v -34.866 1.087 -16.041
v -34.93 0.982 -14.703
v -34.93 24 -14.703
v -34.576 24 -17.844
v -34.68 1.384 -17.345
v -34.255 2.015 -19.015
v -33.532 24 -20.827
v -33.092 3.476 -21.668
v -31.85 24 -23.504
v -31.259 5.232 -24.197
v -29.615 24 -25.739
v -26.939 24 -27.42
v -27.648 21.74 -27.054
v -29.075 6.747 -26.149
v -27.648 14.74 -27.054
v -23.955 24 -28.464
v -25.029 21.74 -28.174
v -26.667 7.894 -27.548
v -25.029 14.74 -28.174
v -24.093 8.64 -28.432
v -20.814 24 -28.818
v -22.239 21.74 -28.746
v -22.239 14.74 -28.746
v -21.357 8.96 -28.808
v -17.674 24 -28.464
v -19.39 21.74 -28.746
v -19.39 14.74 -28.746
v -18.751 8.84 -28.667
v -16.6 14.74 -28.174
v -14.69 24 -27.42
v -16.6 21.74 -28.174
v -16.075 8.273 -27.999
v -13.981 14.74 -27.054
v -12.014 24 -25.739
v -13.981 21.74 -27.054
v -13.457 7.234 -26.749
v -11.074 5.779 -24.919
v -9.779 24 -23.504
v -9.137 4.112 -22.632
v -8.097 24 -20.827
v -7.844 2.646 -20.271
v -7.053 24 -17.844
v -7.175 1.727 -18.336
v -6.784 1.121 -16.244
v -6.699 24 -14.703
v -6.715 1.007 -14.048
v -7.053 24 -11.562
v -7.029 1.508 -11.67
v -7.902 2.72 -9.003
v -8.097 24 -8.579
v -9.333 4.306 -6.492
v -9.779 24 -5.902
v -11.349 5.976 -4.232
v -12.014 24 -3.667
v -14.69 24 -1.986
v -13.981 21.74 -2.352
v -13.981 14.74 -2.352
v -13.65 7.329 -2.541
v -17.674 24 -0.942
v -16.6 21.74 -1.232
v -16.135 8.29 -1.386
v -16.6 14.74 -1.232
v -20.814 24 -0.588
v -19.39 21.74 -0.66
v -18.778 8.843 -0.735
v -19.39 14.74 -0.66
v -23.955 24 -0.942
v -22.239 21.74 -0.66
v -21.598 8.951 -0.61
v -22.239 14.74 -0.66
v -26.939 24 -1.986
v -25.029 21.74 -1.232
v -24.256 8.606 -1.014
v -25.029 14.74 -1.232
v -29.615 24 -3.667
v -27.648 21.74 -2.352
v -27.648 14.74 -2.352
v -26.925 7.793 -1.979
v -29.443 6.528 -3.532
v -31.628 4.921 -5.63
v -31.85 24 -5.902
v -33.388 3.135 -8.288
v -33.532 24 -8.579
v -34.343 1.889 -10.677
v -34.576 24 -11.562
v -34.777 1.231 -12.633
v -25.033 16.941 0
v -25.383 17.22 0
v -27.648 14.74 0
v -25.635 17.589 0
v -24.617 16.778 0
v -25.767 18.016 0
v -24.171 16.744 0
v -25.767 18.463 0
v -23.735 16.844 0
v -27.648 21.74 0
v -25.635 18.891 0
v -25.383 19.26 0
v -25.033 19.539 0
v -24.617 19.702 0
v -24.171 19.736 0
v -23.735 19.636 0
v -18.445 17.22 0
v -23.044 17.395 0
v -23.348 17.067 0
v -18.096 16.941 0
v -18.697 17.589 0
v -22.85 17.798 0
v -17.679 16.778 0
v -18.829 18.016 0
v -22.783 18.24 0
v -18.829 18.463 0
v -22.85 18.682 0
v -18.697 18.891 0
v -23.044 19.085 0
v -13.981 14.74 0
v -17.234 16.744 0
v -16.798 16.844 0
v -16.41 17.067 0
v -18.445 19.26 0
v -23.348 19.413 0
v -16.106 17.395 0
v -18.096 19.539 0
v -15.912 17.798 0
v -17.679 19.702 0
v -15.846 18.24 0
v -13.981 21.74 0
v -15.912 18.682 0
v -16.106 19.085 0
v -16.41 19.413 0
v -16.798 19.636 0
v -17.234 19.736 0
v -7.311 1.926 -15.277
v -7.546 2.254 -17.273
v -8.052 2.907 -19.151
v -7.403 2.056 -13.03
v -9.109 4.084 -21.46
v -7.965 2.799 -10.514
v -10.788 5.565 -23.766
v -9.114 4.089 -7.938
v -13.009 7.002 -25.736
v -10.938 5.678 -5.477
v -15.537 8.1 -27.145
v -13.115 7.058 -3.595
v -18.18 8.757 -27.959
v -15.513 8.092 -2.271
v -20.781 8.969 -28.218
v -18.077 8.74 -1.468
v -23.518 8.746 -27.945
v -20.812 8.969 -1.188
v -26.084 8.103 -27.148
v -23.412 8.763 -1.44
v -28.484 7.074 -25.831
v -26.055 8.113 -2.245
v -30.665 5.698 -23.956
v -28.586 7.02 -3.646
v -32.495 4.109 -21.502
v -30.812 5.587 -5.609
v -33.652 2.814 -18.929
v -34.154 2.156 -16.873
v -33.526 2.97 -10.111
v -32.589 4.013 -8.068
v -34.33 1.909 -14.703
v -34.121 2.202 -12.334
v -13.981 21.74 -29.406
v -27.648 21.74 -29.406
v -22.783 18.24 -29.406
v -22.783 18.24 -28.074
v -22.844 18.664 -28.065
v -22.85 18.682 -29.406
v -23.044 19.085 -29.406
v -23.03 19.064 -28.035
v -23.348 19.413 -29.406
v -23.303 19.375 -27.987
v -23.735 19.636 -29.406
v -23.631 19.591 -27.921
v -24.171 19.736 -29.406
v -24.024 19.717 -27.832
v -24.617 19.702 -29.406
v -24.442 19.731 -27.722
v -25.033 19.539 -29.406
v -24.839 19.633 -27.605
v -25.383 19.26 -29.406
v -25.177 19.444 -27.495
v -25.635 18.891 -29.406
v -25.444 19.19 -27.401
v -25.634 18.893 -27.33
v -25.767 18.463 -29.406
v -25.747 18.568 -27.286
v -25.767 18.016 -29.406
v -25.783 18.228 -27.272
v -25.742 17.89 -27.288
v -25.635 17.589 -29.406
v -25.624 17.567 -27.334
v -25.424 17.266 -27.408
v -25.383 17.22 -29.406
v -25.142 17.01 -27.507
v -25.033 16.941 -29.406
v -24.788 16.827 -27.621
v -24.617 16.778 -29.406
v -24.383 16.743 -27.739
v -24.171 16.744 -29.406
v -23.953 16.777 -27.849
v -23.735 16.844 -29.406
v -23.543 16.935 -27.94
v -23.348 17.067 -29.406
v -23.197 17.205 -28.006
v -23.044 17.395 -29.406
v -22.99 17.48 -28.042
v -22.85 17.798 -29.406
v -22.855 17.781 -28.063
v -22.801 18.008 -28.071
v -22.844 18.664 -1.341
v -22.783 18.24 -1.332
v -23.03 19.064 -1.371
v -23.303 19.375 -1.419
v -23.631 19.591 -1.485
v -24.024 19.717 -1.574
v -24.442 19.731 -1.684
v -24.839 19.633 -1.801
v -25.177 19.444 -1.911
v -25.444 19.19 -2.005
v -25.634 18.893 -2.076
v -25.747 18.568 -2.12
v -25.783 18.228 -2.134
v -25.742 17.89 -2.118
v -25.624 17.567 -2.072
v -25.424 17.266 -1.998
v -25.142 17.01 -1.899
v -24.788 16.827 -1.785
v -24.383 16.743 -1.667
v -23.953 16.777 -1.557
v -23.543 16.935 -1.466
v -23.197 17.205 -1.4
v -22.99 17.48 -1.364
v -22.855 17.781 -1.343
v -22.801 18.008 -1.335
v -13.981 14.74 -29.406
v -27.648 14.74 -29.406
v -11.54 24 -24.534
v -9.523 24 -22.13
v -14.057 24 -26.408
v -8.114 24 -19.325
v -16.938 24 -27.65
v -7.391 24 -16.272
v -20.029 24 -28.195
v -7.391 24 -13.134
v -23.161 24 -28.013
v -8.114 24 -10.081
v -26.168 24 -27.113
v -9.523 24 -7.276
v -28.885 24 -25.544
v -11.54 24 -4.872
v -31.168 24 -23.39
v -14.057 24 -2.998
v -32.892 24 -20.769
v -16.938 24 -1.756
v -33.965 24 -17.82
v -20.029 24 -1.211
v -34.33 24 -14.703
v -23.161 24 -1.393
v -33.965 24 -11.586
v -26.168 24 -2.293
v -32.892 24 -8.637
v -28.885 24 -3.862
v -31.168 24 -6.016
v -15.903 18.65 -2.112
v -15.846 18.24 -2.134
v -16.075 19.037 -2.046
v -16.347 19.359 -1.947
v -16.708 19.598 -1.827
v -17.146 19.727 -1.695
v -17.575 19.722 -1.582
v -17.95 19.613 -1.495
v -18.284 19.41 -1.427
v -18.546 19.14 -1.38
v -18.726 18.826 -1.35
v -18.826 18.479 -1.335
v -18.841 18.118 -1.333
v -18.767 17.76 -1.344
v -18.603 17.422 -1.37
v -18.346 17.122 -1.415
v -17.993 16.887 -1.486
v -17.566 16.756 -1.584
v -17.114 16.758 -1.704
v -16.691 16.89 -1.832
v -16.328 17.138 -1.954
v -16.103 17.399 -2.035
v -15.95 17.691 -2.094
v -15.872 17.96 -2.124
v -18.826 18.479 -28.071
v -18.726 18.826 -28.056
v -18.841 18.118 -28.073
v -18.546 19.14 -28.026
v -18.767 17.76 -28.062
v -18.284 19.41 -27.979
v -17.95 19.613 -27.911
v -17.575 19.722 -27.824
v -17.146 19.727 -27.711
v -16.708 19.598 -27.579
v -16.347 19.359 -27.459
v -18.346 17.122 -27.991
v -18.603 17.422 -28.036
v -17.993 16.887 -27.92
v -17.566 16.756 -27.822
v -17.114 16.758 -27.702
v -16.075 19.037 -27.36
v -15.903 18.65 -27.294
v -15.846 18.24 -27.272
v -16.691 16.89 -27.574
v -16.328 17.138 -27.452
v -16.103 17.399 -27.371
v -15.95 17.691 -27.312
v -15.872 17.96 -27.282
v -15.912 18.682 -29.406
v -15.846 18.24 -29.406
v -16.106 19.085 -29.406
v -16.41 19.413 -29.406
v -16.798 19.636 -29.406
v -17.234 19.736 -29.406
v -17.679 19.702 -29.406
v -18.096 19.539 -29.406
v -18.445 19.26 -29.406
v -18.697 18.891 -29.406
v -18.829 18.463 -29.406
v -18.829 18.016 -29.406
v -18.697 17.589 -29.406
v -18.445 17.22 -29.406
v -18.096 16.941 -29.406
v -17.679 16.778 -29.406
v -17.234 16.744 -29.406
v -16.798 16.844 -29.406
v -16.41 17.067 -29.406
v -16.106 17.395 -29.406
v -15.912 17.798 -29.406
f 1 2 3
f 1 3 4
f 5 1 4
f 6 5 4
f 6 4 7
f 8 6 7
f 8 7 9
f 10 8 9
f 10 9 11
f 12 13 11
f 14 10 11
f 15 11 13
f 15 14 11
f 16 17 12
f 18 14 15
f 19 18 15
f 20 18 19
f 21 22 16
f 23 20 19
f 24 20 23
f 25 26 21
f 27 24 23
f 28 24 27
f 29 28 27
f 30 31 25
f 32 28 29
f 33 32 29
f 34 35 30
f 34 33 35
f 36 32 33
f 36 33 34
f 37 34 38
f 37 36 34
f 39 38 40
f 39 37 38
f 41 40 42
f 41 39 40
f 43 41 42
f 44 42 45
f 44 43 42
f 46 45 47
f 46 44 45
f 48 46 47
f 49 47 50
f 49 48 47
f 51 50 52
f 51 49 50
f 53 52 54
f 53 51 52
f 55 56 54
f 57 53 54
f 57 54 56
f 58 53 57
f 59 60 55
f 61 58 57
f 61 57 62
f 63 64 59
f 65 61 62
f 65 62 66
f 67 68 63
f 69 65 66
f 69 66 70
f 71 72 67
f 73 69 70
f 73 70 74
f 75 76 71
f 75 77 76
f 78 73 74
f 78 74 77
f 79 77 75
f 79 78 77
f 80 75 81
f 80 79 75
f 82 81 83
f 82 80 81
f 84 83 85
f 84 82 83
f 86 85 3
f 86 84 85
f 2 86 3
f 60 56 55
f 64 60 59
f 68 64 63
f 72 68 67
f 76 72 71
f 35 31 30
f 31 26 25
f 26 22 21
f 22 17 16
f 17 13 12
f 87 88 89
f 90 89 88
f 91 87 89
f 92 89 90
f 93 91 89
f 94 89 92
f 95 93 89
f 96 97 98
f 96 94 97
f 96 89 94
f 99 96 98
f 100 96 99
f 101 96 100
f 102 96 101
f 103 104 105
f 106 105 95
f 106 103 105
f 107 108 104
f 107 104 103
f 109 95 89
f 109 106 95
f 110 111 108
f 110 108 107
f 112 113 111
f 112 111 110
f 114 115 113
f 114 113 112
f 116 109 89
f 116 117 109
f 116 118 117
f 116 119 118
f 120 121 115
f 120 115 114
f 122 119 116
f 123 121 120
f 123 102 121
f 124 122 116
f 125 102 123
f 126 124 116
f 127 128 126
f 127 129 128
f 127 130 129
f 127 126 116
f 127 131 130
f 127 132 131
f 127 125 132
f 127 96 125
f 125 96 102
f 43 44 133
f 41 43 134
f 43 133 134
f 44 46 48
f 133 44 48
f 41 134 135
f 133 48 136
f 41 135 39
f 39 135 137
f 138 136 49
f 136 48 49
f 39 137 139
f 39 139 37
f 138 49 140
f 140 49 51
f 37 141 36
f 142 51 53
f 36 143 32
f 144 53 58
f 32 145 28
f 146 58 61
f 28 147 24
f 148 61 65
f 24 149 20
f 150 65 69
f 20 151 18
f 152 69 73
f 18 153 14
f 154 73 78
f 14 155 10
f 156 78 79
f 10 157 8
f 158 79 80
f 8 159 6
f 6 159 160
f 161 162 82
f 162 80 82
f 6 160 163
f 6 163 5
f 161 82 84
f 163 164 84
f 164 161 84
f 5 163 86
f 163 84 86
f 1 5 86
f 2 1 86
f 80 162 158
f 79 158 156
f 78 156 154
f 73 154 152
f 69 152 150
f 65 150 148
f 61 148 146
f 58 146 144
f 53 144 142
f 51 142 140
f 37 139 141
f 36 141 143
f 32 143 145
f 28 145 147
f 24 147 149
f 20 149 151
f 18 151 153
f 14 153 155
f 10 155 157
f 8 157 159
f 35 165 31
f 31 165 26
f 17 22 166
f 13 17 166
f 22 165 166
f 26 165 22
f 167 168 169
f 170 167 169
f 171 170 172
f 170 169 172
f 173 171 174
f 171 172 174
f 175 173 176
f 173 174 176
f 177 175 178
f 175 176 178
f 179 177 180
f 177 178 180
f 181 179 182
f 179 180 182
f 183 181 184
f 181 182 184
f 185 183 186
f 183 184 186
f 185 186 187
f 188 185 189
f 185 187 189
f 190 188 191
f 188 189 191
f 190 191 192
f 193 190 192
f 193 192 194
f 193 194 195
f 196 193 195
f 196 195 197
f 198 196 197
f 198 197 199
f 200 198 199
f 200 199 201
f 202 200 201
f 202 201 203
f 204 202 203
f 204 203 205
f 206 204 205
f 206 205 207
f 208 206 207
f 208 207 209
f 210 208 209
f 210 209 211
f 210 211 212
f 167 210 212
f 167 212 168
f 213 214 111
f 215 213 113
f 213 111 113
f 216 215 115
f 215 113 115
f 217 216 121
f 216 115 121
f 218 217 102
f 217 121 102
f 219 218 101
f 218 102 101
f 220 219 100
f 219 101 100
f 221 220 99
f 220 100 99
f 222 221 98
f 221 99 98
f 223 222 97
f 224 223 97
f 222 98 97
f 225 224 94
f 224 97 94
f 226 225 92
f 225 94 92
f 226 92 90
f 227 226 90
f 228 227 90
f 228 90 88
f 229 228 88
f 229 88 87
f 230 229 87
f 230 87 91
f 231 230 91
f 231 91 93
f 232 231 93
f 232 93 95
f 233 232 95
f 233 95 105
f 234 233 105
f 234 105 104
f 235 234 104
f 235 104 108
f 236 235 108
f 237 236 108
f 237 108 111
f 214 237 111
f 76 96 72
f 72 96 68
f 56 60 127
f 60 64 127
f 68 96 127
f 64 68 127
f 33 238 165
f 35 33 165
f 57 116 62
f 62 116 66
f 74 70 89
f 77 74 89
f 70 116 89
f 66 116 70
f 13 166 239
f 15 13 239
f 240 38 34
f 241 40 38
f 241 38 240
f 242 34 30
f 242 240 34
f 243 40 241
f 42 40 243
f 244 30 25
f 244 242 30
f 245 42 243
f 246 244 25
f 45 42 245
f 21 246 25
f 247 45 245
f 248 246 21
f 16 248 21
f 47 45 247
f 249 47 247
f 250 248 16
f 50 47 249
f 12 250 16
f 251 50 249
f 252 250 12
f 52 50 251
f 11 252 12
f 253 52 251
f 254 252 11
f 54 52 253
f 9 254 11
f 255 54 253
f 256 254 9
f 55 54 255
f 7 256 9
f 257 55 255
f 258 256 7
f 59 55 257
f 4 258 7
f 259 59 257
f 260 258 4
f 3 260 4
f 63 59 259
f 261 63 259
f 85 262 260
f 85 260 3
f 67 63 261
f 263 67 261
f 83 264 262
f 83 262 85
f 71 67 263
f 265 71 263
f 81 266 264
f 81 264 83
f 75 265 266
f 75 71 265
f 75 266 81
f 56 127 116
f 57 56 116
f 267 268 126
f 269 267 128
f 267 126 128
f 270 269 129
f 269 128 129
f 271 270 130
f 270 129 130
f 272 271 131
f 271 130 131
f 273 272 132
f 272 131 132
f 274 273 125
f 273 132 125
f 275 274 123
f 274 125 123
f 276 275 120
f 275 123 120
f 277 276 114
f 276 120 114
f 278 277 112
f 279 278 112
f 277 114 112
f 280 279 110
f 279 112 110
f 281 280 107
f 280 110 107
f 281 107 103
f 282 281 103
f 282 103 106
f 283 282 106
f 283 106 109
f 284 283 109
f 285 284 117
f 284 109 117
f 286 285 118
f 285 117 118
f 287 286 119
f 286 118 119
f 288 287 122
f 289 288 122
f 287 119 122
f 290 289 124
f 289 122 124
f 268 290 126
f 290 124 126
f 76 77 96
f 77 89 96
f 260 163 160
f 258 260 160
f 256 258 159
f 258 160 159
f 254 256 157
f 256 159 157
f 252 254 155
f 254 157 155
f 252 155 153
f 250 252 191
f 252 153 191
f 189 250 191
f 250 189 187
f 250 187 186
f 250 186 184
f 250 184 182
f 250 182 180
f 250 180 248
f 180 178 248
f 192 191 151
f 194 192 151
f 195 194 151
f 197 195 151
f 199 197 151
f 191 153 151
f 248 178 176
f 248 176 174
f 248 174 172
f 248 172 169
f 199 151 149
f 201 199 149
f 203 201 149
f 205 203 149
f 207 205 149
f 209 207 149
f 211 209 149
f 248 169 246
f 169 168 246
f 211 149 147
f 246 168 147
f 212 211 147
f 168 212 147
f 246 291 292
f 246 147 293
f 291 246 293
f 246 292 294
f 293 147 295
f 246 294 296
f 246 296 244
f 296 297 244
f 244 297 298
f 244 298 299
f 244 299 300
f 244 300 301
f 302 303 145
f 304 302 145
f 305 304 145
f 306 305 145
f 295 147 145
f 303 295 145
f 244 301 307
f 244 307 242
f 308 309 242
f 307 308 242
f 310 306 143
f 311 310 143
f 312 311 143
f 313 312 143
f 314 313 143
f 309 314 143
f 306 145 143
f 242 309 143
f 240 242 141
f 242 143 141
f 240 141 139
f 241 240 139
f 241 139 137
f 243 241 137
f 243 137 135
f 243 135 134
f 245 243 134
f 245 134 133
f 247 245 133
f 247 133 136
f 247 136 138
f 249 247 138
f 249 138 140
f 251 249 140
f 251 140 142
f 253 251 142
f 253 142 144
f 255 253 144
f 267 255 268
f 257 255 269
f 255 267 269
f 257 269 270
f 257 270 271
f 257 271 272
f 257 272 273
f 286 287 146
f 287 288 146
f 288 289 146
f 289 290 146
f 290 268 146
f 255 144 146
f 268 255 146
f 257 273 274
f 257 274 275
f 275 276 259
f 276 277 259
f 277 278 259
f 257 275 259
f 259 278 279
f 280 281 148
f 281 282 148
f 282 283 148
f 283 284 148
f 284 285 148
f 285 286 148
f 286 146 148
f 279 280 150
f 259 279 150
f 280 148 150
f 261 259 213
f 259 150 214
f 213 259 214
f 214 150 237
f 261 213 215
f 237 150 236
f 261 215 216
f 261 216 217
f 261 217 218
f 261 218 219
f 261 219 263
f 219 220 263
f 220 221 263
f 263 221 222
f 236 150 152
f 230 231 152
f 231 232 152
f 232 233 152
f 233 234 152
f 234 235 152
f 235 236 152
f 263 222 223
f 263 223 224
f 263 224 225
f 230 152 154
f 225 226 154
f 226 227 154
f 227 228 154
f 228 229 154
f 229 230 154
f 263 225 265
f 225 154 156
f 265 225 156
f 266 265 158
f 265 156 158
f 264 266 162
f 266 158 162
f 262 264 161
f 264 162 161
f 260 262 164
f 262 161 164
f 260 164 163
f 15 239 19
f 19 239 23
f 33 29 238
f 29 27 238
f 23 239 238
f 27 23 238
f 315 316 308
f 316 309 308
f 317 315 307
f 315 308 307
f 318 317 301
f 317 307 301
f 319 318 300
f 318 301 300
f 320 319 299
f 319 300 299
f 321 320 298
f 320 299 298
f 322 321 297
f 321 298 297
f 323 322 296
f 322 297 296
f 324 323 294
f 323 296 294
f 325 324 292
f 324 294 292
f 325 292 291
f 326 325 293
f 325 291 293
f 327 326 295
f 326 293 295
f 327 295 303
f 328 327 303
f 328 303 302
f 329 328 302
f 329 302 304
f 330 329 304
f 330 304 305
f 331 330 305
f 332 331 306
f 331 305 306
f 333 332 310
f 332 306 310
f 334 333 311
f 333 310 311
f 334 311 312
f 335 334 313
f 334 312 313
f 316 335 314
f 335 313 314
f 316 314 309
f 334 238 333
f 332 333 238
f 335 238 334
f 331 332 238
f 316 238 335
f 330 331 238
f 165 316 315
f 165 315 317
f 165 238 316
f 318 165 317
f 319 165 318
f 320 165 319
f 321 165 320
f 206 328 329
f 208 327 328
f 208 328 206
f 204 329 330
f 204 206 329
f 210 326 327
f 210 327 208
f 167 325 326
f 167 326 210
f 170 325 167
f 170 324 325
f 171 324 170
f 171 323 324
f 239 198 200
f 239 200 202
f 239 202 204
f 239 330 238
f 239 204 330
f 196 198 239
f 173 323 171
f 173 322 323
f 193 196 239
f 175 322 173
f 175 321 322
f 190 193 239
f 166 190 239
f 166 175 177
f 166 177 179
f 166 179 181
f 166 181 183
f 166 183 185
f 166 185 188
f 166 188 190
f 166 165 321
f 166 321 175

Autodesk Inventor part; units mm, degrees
ref_plane "YZ Plane" through (0, 0, 0) normal (1, 0, 0) x (0, 1, 0)
ref_plane "XZ Plane" through (0, 0, 0) normal (0, 1, 0) x (-1, 0, 0)
sketch "Sketch1" plane through (0, 0, 0) normal (0, 1, 0) x (-1, 0, 0)
  circle A0 centre (20.8145, -14.703) radius 14.1152
  circle A1 centre (20.8145, -14.703) radius 13.5152
  point P0 (0, 0)
  dimension "d0" = 0.6
extrude "Extrusion1" add sketch "Sketch1" along normal blind 24
ref_plane "Work Plane1" through (0, 0, -29) normal (0, 0, 1) x (1, 0, 0)
sketch "Sketch3" plane through (0, 0, 0) normal (1, 0, 0) x (0, 1, 0)
  point P0 (0, 0)
sketch "Sketch4" plane through (0, 0, 0) normal (0, 0, 1) x (1, 0, 0)
  line L0 (-34.9297, 0) -> (-34.9297, 24) projected
  line L1 (-6.6992, 0) -> (-6.6992, 24) projected
  line L2 (-34.9297, 18.2399) -> (-20.8145, 18.2399) construction
  line L3 (-20.8145, 18.2399) -> (-6.6992, 18.2399) construction
  line L4 (-13.9813, 14.7399) -> (-27.6476, 14.7399)
  line L5 (-27.6476, 14.7399) -> (-27.6476, 21.7399)
  line L6 (-27.6476, 21.7399) -> (-13.9813, 21.7399)
  line L7 (-13.9813, 21.7399) -> (-13.9813, 14.7399)
  line L8 (-13.9813, 14.7399) -> (-27.6476, 21.7399) construction
  line L9 (-27.6476, 14.7399) -> (-13.9813, 21.7399) construction
  point P0 (0, 0)
  dimension "d14" = 7
extrude "Extrusion3" add sketch "Sketch4" against normal up to surface
sketch "Sketch5" plane through (-20.8145, 24, -14.703) normal (0, 1, 0) x (1, 0, 0)
  point P0 (20.8145, -14.703)
  point P1 (0, 0)
ref_plane "Work Plane2" through (-20.8145, 24, -14.703) normal (0, 0, 1) x (1, 0, 0)
mirror "Mirror1" about plane through (-20.8145, 24, -14.703) normal (0, 0, 1) of "Extrusion3"
sketch "Sketch6" plane through (0, 0, 0) normal (0, 0, 1) x (1, 0, 0)
  line L0 (-13.9813, 14.7399) -> (-13.9813, 21.7399) projected
  line L1 (-13.9813, 21.7399) -> (-27.6476, 21.7399) projected
  line L2 (-27.6476, 21.7399) -> (-27.6476, 14.7399) projected
  line L3 (-27.6476, 14.7399) -> (-13.9813, 14.7399) projected
  line L4 (-17.3456, 21.7399) -> (-17.3456, 18.2399) construction
  line L5 (-17.3456, 18.2399) -> (-17.3456, 14.7399) construction
  line L6 (-24.2833, 21.7399) -> (-24.2833, 18.2399) construction
  line L7 (-24.2833, 18.2399) -> (-24.2833, 14.7399) construction
  line L8 (-17.3456, 18.2399) -> (-13.9813, 18.2399) construction
  line L9 (-13.9813, 21.7399) -> (-13.9813, 14.7399) construction
  line L10 (-24.2833, 18.2399) -> (-27.6476, 18.2399) construction
  circle A0 centre (-17.3456, 18.2399) radius 1.5
  circle A1 centre (-24.2833, 18.2399) radius 1.5
  point P0 (0, 0)
  dimension "d10" = 3
  dimension "d11" = 3
extrude "Extrusion4" cut sketch "Sketch6" against normal blind 72.25 contours A0 | A1
sketch "Sketch7" plane through (0, 0, 0) normal (0, 0, 1) x (1, 0, 0)
  circle A0 centre (-20.8145, -7.4962) radius 16.4655
  line L0 (-34.9297, 0) -> (-34.9297, 24) projected
  line L1 (-6.6992, 0) -> (-6.6992, 24) projected
  line L2 (-34.9297, 12) -> (-20.8145, 12)
  line L3 (-20.8145, 12) -> (-6.6992, 12)
  line L4 (-20.8145, 12) -> (-20.8145, -15.8986) construction
  point P0 (0, 0)
  dimension "d15" = 32.931
extrude "Extrusion5" cut sketch "Sketch7" against normal blind 60.25 contours A0
